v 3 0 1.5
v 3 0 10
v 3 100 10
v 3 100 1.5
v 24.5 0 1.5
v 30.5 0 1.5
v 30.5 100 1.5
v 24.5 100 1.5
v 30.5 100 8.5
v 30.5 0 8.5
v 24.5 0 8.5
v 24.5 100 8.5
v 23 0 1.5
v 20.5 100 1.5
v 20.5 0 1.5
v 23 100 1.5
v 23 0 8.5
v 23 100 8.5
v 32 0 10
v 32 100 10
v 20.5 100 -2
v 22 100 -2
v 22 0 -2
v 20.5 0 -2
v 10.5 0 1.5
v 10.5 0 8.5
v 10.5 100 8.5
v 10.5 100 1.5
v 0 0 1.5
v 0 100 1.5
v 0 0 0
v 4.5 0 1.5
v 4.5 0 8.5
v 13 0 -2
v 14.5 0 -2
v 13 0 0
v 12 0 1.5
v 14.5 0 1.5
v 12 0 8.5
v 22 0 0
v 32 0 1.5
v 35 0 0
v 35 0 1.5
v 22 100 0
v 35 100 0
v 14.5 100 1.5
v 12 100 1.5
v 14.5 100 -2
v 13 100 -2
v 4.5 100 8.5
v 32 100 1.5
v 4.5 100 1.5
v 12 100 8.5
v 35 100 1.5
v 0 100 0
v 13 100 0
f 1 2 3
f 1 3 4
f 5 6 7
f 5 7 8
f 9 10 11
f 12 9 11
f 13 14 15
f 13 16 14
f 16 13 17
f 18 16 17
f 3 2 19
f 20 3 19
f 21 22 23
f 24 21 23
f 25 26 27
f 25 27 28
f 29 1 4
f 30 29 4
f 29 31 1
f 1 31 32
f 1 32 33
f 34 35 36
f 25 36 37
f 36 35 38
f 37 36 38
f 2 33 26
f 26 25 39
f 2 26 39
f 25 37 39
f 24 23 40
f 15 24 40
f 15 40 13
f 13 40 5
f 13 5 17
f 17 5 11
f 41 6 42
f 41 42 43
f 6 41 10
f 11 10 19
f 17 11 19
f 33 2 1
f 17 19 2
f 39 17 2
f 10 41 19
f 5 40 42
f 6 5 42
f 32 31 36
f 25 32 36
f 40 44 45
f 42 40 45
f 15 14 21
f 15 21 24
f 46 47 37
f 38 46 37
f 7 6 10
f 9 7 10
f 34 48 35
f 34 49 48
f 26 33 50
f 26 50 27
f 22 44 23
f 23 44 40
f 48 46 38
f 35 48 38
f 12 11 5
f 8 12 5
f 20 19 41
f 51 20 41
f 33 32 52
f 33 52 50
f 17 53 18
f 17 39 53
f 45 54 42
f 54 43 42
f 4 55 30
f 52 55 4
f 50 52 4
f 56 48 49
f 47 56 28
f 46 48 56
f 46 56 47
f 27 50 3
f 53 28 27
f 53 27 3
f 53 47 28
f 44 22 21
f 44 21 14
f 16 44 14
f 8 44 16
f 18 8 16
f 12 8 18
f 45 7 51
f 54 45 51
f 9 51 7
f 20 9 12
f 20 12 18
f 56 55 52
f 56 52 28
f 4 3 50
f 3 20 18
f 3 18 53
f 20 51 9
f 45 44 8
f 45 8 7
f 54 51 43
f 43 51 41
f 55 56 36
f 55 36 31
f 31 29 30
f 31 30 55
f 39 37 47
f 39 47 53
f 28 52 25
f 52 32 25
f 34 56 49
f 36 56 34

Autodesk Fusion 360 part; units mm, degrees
sketch "Sketch1" plane through (0, 0, 0) normal (0, 1, 0) x (1, 0, 0)
  line L0 (0, -1) -> (0, 0)
  line L1 (12, 0) -> (12, 1)
  line L2 (12, 1) -> (13, 1)
  line L3 (2, -1.5) -> (2, -2.5)
  line L4 (2, -2.5) -> (1, -2.5)
  line L5 (2, -1.5) -> (3, -1.5)
  line L6 (4.5, -1.5) -> (4.5, -8.5)
  line L7 (3, -8.5) -> (3, -1.5)
  line L8 (4.5, -1.5) -> (10.5, -1.5)
  line L9 (12, -1.5) -> (12, -8.5)
  line L10 (10.5, -8.5) -> (10.5, -1.5)
  line L11 (17.5, -10) -> (3, -10)
  line L12 (3, -10) -> (3, -8.5)
  line L13 (4.5, -8.5) -> (10.5, -8.5)
  line L14 (12, -8.5) -> (17.5, -8.5)
  line L15 (1, -2.5) -> (1, -1)
  line L16 (1, -1) -> (0, -1)
  line L17 (12, -1.5) -> (13, -1.5)
  line L18 (13, -1.5) -> (13, 1)
  line L19 (12, 0) -> (0, 0)
  line L20 (23, -1.5) -> (23, -8.5)
  line L21 (22, -1.5) -> (22, 1)
  line L22 (32, -8.5) -> (32, -1.5)
  line L23 (30.5, -8.5) -> (24.5, -8.5)
  line L24 (30.5, -1.5) -> (24.5, -1.5)
  line L25 (32, -10) -> (32, -8.5)
  line L26 (23, 0) -> (23, 1)
  line L27 (33, -1.5) -> (32, -1.5)
  line L28 (23, 1) -> (22, 1)
  line L29 (34, -2.5) -> (34, -1)
  line L30 (24.5, -8.5) -> (24.5, -1.5)
  line L31 (23, 0) -> (35, 0)
  line L32 (23, -1.5) -> (22, -1.5)
  line L33 (34, -1) -> (35, -1)
  line L34 (30.5, -1.5) -> (30.5, -8.5)
  line L35 (33, -1.5) -> (33, -2.5)
  line L36 (35, -1) -> (35, 0)
  line L37 (23, -8.5) -> (17.5, -8.5)
  line L38 (17.5, -10) -> (32, -10)
  line L39 (33, -2.5) -> (34, -2.5)
  point P0 (35, 0)
  dimension "d2" = 1
  dimension "d9" = 1
  dimension "d10" = 1.5
  dimension "d11" = 7
  dimension "d12" = 6
  dimension "d13" = 1.5
  dimension "d14" = 7
  dimension "d15" = 14.5
  dimension "d16" = 1.5
extrude "Extrude1" add sketch "Sketch1" along normal blind 5
extrude "Extrude2" add 1 faces at (10.3333, 5, 9.5) along direction (0, 1, 0) blind 95
extrude "Extrude3" cut 1 faces at (1.6667, 66.6667, 2.5) along direction (0, 0, -1) blind 1
extrude "Extrude4" add 1 faces at (1, 66.6667, 1.3333) along direction (-1, 0, 0) blind 1
extrude "Extrude5" cut 1 faces at (33.3333, 33.3333, 2.5) along direction (0, 0, -1) blind 1
extrude "Extrude6" add 1 faces at (34, 66.6667, 1.3333) along direction (1, 0, 0) blind 1
extrude "Extrude7" add 1 faces at (13, 33.3333, 0.6667) along direction (1, 0, 0) blind 1
extrude "Extrude8" cut 1 faces at (12, 66.6667, -0.3333) along direction (1, 0, 0) blind 1
extrude "Extrude9" add 1 faces at (22, 33.3333, 0.6667) along direction (-1, 0, 0) blind 1
extrude "Extrude10" cut 1 faces at (23, 33.3333, -0.3333) along direction (-1, 0, 0) blind 1
extrude "Extrude11" add 1 faces at (13.3333, 66.6667, -1) along direction (0, 0, -1) blind 1
extrude "Extrude12" add 1 faces at (21.6667, 66.6667, -1) along direction (0, 0, -1) blind 1
extrude "Extrude13" add 1 faces at (14, 33.3333, -0.8333) along direction (1, 0, 0) blind 0.5
extrude "Extrude14" add 1 faces at (21, 66.6667, 0.3333) along direction (-1, 0, 0) blind 0.5
